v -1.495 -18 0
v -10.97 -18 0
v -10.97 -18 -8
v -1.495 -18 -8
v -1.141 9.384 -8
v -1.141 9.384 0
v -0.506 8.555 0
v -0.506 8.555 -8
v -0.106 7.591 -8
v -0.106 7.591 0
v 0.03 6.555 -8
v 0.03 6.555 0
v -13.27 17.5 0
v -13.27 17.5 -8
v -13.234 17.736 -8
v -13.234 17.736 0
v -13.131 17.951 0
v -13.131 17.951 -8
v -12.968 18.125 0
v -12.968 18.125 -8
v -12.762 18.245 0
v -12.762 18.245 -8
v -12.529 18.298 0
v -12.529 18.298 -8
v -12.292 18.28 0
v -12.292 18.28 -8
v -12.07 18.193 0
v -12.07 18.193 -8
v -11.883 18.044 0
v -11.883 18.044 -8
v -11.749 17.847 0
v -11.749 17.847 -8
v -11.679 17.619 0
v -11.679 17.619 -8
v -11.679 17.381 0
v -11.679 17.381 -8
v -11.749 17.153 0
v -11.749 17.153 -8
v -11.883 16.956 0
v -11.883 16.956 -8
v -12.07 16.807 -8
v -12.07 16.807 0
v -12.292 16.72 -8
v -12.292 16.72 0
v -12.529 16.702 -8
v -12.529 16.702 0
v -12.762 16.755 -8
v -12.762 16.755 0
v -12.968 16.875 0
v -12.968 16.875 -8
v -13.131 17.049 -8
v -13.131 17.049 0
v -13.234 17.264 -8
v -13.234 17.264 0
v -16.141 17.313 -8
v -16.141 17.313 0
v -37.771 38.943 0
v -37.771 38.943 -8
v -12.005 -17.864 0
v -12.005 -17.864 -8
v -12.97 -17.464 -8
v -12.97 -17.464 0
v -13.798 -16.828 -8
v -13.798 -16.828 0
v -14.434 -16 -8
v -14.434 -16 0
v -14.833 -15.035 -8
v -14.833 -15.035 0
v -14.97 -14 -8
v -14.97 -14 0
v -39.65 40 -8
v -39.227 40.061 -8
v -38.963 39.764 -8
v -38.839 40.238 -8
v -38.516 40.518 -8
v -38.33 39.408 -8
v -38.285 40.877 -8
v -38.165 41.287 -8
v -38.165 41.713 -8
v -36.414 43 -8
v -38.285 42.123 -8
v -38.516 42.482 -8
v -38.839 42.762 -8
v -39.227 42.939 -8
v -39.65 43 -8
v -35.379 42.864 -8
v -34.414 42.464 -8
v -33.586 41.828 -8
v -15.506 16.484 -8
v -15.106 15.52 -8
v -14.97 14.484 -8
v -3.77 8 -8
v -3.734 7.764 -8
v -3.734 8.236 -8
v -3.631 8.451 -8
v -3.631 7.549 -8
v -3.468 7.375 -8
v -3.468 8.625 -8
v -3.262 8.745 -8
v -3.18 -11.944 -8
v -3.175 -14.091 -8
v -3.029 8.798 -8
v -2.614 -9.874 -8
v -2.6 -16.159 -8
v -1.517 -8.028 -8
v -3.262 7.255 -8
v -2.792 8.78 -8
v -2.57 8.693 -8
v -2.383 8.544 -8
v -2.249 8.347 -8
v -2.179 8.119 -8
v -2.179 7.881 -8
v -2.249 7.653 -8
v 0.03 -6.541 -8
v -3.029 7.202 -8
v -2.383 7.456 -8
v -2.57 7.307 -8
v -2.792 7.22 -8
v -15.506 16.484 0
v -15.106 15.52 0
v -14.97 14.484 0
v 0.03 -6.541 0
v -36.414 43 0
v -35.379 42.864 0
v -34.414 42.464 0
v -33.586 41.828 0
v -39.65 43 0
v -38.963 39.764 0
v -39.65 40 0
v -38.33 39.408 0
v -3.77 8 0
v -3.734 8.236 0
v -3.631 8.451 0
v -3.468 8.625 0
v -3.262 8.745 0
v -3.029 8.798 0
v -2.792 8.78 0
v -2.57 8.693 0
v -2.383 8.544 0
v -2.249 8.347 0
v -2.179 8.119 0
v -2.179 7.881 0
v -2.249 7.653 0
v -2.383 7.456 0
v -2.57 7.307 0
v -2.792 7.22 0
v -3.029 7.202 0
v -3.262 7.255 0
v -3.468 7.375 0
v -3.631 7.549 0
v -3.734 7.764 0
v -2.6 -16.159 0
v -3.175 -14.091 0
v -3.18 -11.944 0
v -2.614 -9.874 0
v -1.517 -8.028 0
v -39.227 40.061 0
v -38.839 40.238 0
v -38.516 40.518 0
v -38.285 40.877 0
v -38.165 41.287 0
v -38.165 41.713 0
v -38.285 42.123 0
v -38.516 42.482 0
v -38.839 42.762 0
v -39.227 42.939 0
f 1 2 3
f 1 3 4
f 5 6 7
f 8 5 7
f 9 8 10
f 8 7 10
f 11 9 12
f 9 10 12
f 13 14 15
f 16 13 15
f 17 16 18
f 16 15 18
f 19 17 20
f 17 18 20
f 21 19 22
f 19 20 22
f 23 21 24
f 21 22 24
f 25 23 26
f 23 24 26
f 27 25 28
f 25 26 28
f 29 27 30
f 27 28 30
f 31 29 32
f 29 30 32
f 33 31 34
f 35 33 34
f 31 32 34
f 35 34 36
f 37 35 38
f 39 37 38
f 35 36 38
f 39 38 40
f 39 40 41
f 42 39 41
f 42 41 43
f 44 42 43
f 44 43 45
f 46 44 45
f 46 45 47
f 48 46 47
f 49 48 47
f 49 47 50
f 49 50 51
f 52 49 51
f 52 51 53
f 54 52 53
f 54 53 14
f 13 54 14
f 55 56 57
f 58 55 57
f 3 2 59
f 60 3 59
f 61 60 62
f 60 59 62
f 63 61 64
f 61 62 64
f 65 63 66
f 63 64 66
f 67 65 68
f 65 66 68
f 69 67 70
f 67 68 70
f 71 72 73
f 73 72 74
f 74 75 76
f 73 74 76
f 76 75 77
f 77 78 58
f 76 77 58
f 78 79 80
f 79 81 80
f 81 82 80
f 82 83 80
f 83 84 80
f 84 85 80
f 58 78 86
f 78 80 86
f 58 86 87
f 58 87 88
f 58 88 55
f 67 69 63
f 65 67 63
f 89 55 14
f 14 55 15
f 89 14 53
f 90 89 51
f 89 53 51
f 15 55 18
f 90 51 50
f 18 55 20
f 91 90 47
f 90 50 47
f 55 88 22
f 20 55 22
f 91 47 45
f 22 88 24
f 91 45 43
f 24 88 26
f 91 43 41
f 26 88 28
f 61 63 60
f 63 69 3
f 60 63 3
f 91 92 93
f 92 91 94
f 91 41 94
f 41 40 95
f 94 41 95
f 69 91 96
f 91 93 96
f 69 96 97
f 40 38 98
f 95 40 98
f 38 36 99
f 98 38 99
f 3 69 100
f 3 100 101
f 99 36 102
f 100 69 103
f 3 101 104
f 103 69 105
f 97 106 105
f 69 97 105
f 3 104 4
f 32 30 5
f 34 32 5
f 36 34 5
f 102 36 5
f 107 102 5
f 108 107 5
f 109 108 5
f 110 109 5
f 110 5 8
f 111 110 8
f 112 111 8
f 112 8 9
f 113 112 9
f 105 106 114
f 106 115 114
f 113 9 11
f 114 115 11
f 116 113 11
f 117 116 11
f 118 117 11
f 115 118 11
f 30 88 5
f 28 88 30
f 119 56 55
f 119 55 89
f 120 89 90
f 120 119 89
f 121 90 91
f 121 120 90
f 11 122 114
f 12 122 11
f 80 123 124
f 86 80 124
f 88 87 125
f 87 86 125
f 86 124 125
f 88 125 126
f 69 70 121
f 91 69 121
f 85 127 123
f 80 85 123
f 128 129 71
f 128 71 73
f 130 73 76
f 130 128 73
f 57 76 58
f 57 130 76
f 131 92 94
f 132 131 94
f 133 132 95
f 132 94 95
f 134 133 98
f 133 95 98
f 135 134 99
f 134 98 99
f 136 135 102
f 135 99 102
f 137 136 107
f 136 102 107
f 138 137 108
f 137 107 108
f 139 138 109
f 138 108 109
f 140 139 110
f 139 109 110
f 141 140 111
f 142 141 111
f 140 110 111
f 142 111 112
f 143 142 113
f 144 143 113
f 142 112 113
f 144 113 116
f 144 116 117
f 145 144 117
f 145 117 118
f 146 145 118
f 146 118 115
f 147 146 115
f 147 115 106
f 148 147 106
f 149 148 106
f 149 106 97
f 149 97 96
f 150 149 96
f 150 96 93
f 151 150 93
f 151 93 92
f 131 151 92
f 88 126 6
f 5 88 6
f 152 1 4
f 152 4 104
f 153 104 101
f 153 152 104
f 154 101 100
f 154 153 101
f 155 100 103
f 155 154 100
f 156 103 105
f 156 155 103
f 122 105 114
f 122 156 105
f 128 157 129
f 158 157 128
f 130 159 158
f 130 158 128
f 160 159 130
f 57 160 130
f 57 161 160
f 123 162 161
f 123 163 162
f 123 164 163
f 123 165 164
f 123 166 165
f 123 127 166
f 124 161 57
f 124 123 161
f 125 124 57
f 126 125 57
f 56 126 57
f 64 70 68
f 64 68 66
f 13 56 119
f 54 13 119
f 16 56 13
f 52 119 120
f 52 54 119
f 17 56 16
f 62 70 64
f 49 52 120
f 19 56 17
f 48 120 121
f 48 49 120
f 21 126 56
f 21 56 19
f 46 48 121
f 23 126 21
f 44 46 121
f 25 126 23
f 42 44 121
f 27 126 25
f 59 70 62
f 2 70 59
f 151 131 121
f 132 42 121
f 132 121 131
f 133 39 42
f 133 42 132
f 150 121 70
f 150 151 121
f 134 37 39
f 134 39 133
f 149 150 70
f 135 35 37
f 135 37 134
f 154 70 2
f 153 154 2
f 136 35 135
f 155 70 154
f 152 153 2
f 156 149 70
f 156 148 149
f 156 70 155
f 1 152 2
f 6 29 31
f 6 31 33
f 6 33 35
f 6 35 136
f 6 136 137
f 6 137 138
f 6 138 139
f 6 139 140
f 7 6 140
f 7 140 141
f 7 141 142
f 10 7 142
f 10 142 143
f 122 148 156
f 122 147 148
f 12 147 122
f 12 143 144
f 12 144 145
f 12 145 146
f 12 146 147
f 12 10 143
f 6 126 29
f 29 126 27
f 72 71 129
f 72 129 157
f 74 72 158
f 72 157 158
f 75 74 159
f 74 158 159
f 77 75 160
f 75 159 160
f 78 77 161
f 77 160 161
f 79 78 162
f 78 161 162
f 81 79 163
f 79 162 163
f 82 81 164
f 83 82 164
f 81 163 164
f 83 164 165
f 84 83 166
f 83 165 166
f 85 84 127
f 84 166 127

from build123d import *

# Parameters (mm, degrees)
EXTRUDE_618_DEPTH   = 8
HOLE_WIZARD_M2_D    = 1.6
SKETCH_5_W          = 15
SKETCH_5_H          = 23
EXTRUDE_1905_DEPTH  = 8
FILLET_1_R          = 4
CUT_EXTRUDE_1_DEPTH = 60.03470161


with BuildPart() as part:
    # Эскиз1 → Extrude 618 (new body)
    with BuildSketch(Plane.XY):
        with BuildLine():
            Line((0.03033425, 5), (-14.96966575, 5))
            Line((-14.96966575, 5), (-14.96966575, 16.141238626))
            Line((-14.96966575, 16.141238626), (-38.828427125, 40))
            Line((-38.828427125, 40), (-39.64966575, 40))
            ThreePointArc((-39.64966575, 40), (-38.14966575, 41.5), (-39.64966575, 43))
            Line((-39.64966575, 43), (-34.757359313, 43))
            Line((-34.757359313, 43), (0.03033425, 8.212306438))
            Line((0.03033425, 8.212306438), (0.03033425, 5))
        make_face()
    extrude(amount=-EXTRUDE_618_DEPTH)

    # Крепление M2 (through all)
    with Locations(Plane.XY):
        with Locations((-2.96966575, 8), (-12.46966575, 17.5)):
            Hole(HOLE_WIZARD_M2_D / 2)

    # Эскиз5 → Extrude 1905 (add)
    with BuildSketch(Plane.XY):
        with Locations((-7.46966575, -6.5)):
            Rectangle(SKETCH_5_W, SKETCH_5_H)
    extrude(amount=-EXTRUDE_1905_DEPTH)

    # Скругление1
    # the kernel refuses this fillet: 4 mm, written as the material it adds along each edge
    with BuildSketch(Plane(origin=(-38.828427125, 40, 0), x_dir=(-1.0, -1.0209461682873532e-12, 0), z_dir=(0, 0, -1))) as fillet_1_piece_1:
        with BuildLine():
            CenterArc((1.771325284, -3.885528966), FILLET_1_R, 103.740313028, 31.259686972)
            Line((-1.057101841, -1.057101841), (0, 0))
            Line((0, 0), (0.821238626, 0))
        make_face()
    extrude(amount=8)
    with BuildSketch(Plane(origin=(-14.96966575, 16.141238626, 0), x_dir=(-0.7071067811865497, 0.7071067811865454, 0), z_dir=(0, 0, -1))) as fillet_1_piece_2:
        with BuildLine():
            CenterArc((FILLET_1_R * 0.414213562373, -FILLET_1_R), FILLET_1_R, 90, 45)
            Line((-FILLET_1_R * 0.292893218813, -FILLET_1_R * 0.292893218813), (0, 0))
            Line((0, 0), (FILLET_1_R * 0.414213562373, 0))
        make_face()
    extrude(amount=8)
    # the kernel refuses this fillet: 4 mm, written as the material it takes off along each edge
    with BuildSketch(Plane(origin=(-34.757359313, 43, 4.142135624), x_dir=(0.7071067811865497, -0.7071067811865454, 0), z_dir=(0, 0, -1)), Plane(origin=(0.03033425, 8.212306438, 4.142135624), x_dir=(0, -1, 0), z_dir=(0, 0, -1))) as fillet_1_2_piece_1:
        with BuildLine():
            CenterArc((FILLET_1_R * 0.414213562373, FILLET_1_R), FILLET_1_R, 225, 45)
            Line((-FILLET_1_R * 0.292893218813, FILLET_1_R * 0.292893218813), (0, 0))
            Line((0, 0), (FILLET_1_R * 0.414213562373, 0))
        make_face()
    extrude(amount=16.284271247, mode=Mode.SUBTRACT)
    with BuildSketch(Plane(origin=(-14.96966575, -18, 10), x_dir=(1, 0, 0), z_dir=(0, 0, -1))) as fillet_1_2_piece_2:
        with BuildLine():
            CenterArc((FILLET_1_R, -FILLET_1_R), FILLET_1_R, 90, 90)
            Line((0, -FILLET_1_R), (0, 0))
            Line((0, 0), (FILLET_1_R, 0))
        make_face()
    extrude(amount=28, mode=Mode.SUBTRACT)

    # Эскиз6 → Вырез-Вытянуть1 (cut, through all)
    with BuildSketch(Plane.XY):
        with BuildLine():
            Line((0.03033425, -6.540529805), (0.03033425, -19.459470195))
            ThreePointArc((0.03033425, -19.459470195), (-3.25, -13), (0.03033425, -6.540529805))
        make_face()
    extrude(amount=-CUT_EXTRUDE_1_DEPTH, mode=Mode.SUBTRACT)


solid = part.part
